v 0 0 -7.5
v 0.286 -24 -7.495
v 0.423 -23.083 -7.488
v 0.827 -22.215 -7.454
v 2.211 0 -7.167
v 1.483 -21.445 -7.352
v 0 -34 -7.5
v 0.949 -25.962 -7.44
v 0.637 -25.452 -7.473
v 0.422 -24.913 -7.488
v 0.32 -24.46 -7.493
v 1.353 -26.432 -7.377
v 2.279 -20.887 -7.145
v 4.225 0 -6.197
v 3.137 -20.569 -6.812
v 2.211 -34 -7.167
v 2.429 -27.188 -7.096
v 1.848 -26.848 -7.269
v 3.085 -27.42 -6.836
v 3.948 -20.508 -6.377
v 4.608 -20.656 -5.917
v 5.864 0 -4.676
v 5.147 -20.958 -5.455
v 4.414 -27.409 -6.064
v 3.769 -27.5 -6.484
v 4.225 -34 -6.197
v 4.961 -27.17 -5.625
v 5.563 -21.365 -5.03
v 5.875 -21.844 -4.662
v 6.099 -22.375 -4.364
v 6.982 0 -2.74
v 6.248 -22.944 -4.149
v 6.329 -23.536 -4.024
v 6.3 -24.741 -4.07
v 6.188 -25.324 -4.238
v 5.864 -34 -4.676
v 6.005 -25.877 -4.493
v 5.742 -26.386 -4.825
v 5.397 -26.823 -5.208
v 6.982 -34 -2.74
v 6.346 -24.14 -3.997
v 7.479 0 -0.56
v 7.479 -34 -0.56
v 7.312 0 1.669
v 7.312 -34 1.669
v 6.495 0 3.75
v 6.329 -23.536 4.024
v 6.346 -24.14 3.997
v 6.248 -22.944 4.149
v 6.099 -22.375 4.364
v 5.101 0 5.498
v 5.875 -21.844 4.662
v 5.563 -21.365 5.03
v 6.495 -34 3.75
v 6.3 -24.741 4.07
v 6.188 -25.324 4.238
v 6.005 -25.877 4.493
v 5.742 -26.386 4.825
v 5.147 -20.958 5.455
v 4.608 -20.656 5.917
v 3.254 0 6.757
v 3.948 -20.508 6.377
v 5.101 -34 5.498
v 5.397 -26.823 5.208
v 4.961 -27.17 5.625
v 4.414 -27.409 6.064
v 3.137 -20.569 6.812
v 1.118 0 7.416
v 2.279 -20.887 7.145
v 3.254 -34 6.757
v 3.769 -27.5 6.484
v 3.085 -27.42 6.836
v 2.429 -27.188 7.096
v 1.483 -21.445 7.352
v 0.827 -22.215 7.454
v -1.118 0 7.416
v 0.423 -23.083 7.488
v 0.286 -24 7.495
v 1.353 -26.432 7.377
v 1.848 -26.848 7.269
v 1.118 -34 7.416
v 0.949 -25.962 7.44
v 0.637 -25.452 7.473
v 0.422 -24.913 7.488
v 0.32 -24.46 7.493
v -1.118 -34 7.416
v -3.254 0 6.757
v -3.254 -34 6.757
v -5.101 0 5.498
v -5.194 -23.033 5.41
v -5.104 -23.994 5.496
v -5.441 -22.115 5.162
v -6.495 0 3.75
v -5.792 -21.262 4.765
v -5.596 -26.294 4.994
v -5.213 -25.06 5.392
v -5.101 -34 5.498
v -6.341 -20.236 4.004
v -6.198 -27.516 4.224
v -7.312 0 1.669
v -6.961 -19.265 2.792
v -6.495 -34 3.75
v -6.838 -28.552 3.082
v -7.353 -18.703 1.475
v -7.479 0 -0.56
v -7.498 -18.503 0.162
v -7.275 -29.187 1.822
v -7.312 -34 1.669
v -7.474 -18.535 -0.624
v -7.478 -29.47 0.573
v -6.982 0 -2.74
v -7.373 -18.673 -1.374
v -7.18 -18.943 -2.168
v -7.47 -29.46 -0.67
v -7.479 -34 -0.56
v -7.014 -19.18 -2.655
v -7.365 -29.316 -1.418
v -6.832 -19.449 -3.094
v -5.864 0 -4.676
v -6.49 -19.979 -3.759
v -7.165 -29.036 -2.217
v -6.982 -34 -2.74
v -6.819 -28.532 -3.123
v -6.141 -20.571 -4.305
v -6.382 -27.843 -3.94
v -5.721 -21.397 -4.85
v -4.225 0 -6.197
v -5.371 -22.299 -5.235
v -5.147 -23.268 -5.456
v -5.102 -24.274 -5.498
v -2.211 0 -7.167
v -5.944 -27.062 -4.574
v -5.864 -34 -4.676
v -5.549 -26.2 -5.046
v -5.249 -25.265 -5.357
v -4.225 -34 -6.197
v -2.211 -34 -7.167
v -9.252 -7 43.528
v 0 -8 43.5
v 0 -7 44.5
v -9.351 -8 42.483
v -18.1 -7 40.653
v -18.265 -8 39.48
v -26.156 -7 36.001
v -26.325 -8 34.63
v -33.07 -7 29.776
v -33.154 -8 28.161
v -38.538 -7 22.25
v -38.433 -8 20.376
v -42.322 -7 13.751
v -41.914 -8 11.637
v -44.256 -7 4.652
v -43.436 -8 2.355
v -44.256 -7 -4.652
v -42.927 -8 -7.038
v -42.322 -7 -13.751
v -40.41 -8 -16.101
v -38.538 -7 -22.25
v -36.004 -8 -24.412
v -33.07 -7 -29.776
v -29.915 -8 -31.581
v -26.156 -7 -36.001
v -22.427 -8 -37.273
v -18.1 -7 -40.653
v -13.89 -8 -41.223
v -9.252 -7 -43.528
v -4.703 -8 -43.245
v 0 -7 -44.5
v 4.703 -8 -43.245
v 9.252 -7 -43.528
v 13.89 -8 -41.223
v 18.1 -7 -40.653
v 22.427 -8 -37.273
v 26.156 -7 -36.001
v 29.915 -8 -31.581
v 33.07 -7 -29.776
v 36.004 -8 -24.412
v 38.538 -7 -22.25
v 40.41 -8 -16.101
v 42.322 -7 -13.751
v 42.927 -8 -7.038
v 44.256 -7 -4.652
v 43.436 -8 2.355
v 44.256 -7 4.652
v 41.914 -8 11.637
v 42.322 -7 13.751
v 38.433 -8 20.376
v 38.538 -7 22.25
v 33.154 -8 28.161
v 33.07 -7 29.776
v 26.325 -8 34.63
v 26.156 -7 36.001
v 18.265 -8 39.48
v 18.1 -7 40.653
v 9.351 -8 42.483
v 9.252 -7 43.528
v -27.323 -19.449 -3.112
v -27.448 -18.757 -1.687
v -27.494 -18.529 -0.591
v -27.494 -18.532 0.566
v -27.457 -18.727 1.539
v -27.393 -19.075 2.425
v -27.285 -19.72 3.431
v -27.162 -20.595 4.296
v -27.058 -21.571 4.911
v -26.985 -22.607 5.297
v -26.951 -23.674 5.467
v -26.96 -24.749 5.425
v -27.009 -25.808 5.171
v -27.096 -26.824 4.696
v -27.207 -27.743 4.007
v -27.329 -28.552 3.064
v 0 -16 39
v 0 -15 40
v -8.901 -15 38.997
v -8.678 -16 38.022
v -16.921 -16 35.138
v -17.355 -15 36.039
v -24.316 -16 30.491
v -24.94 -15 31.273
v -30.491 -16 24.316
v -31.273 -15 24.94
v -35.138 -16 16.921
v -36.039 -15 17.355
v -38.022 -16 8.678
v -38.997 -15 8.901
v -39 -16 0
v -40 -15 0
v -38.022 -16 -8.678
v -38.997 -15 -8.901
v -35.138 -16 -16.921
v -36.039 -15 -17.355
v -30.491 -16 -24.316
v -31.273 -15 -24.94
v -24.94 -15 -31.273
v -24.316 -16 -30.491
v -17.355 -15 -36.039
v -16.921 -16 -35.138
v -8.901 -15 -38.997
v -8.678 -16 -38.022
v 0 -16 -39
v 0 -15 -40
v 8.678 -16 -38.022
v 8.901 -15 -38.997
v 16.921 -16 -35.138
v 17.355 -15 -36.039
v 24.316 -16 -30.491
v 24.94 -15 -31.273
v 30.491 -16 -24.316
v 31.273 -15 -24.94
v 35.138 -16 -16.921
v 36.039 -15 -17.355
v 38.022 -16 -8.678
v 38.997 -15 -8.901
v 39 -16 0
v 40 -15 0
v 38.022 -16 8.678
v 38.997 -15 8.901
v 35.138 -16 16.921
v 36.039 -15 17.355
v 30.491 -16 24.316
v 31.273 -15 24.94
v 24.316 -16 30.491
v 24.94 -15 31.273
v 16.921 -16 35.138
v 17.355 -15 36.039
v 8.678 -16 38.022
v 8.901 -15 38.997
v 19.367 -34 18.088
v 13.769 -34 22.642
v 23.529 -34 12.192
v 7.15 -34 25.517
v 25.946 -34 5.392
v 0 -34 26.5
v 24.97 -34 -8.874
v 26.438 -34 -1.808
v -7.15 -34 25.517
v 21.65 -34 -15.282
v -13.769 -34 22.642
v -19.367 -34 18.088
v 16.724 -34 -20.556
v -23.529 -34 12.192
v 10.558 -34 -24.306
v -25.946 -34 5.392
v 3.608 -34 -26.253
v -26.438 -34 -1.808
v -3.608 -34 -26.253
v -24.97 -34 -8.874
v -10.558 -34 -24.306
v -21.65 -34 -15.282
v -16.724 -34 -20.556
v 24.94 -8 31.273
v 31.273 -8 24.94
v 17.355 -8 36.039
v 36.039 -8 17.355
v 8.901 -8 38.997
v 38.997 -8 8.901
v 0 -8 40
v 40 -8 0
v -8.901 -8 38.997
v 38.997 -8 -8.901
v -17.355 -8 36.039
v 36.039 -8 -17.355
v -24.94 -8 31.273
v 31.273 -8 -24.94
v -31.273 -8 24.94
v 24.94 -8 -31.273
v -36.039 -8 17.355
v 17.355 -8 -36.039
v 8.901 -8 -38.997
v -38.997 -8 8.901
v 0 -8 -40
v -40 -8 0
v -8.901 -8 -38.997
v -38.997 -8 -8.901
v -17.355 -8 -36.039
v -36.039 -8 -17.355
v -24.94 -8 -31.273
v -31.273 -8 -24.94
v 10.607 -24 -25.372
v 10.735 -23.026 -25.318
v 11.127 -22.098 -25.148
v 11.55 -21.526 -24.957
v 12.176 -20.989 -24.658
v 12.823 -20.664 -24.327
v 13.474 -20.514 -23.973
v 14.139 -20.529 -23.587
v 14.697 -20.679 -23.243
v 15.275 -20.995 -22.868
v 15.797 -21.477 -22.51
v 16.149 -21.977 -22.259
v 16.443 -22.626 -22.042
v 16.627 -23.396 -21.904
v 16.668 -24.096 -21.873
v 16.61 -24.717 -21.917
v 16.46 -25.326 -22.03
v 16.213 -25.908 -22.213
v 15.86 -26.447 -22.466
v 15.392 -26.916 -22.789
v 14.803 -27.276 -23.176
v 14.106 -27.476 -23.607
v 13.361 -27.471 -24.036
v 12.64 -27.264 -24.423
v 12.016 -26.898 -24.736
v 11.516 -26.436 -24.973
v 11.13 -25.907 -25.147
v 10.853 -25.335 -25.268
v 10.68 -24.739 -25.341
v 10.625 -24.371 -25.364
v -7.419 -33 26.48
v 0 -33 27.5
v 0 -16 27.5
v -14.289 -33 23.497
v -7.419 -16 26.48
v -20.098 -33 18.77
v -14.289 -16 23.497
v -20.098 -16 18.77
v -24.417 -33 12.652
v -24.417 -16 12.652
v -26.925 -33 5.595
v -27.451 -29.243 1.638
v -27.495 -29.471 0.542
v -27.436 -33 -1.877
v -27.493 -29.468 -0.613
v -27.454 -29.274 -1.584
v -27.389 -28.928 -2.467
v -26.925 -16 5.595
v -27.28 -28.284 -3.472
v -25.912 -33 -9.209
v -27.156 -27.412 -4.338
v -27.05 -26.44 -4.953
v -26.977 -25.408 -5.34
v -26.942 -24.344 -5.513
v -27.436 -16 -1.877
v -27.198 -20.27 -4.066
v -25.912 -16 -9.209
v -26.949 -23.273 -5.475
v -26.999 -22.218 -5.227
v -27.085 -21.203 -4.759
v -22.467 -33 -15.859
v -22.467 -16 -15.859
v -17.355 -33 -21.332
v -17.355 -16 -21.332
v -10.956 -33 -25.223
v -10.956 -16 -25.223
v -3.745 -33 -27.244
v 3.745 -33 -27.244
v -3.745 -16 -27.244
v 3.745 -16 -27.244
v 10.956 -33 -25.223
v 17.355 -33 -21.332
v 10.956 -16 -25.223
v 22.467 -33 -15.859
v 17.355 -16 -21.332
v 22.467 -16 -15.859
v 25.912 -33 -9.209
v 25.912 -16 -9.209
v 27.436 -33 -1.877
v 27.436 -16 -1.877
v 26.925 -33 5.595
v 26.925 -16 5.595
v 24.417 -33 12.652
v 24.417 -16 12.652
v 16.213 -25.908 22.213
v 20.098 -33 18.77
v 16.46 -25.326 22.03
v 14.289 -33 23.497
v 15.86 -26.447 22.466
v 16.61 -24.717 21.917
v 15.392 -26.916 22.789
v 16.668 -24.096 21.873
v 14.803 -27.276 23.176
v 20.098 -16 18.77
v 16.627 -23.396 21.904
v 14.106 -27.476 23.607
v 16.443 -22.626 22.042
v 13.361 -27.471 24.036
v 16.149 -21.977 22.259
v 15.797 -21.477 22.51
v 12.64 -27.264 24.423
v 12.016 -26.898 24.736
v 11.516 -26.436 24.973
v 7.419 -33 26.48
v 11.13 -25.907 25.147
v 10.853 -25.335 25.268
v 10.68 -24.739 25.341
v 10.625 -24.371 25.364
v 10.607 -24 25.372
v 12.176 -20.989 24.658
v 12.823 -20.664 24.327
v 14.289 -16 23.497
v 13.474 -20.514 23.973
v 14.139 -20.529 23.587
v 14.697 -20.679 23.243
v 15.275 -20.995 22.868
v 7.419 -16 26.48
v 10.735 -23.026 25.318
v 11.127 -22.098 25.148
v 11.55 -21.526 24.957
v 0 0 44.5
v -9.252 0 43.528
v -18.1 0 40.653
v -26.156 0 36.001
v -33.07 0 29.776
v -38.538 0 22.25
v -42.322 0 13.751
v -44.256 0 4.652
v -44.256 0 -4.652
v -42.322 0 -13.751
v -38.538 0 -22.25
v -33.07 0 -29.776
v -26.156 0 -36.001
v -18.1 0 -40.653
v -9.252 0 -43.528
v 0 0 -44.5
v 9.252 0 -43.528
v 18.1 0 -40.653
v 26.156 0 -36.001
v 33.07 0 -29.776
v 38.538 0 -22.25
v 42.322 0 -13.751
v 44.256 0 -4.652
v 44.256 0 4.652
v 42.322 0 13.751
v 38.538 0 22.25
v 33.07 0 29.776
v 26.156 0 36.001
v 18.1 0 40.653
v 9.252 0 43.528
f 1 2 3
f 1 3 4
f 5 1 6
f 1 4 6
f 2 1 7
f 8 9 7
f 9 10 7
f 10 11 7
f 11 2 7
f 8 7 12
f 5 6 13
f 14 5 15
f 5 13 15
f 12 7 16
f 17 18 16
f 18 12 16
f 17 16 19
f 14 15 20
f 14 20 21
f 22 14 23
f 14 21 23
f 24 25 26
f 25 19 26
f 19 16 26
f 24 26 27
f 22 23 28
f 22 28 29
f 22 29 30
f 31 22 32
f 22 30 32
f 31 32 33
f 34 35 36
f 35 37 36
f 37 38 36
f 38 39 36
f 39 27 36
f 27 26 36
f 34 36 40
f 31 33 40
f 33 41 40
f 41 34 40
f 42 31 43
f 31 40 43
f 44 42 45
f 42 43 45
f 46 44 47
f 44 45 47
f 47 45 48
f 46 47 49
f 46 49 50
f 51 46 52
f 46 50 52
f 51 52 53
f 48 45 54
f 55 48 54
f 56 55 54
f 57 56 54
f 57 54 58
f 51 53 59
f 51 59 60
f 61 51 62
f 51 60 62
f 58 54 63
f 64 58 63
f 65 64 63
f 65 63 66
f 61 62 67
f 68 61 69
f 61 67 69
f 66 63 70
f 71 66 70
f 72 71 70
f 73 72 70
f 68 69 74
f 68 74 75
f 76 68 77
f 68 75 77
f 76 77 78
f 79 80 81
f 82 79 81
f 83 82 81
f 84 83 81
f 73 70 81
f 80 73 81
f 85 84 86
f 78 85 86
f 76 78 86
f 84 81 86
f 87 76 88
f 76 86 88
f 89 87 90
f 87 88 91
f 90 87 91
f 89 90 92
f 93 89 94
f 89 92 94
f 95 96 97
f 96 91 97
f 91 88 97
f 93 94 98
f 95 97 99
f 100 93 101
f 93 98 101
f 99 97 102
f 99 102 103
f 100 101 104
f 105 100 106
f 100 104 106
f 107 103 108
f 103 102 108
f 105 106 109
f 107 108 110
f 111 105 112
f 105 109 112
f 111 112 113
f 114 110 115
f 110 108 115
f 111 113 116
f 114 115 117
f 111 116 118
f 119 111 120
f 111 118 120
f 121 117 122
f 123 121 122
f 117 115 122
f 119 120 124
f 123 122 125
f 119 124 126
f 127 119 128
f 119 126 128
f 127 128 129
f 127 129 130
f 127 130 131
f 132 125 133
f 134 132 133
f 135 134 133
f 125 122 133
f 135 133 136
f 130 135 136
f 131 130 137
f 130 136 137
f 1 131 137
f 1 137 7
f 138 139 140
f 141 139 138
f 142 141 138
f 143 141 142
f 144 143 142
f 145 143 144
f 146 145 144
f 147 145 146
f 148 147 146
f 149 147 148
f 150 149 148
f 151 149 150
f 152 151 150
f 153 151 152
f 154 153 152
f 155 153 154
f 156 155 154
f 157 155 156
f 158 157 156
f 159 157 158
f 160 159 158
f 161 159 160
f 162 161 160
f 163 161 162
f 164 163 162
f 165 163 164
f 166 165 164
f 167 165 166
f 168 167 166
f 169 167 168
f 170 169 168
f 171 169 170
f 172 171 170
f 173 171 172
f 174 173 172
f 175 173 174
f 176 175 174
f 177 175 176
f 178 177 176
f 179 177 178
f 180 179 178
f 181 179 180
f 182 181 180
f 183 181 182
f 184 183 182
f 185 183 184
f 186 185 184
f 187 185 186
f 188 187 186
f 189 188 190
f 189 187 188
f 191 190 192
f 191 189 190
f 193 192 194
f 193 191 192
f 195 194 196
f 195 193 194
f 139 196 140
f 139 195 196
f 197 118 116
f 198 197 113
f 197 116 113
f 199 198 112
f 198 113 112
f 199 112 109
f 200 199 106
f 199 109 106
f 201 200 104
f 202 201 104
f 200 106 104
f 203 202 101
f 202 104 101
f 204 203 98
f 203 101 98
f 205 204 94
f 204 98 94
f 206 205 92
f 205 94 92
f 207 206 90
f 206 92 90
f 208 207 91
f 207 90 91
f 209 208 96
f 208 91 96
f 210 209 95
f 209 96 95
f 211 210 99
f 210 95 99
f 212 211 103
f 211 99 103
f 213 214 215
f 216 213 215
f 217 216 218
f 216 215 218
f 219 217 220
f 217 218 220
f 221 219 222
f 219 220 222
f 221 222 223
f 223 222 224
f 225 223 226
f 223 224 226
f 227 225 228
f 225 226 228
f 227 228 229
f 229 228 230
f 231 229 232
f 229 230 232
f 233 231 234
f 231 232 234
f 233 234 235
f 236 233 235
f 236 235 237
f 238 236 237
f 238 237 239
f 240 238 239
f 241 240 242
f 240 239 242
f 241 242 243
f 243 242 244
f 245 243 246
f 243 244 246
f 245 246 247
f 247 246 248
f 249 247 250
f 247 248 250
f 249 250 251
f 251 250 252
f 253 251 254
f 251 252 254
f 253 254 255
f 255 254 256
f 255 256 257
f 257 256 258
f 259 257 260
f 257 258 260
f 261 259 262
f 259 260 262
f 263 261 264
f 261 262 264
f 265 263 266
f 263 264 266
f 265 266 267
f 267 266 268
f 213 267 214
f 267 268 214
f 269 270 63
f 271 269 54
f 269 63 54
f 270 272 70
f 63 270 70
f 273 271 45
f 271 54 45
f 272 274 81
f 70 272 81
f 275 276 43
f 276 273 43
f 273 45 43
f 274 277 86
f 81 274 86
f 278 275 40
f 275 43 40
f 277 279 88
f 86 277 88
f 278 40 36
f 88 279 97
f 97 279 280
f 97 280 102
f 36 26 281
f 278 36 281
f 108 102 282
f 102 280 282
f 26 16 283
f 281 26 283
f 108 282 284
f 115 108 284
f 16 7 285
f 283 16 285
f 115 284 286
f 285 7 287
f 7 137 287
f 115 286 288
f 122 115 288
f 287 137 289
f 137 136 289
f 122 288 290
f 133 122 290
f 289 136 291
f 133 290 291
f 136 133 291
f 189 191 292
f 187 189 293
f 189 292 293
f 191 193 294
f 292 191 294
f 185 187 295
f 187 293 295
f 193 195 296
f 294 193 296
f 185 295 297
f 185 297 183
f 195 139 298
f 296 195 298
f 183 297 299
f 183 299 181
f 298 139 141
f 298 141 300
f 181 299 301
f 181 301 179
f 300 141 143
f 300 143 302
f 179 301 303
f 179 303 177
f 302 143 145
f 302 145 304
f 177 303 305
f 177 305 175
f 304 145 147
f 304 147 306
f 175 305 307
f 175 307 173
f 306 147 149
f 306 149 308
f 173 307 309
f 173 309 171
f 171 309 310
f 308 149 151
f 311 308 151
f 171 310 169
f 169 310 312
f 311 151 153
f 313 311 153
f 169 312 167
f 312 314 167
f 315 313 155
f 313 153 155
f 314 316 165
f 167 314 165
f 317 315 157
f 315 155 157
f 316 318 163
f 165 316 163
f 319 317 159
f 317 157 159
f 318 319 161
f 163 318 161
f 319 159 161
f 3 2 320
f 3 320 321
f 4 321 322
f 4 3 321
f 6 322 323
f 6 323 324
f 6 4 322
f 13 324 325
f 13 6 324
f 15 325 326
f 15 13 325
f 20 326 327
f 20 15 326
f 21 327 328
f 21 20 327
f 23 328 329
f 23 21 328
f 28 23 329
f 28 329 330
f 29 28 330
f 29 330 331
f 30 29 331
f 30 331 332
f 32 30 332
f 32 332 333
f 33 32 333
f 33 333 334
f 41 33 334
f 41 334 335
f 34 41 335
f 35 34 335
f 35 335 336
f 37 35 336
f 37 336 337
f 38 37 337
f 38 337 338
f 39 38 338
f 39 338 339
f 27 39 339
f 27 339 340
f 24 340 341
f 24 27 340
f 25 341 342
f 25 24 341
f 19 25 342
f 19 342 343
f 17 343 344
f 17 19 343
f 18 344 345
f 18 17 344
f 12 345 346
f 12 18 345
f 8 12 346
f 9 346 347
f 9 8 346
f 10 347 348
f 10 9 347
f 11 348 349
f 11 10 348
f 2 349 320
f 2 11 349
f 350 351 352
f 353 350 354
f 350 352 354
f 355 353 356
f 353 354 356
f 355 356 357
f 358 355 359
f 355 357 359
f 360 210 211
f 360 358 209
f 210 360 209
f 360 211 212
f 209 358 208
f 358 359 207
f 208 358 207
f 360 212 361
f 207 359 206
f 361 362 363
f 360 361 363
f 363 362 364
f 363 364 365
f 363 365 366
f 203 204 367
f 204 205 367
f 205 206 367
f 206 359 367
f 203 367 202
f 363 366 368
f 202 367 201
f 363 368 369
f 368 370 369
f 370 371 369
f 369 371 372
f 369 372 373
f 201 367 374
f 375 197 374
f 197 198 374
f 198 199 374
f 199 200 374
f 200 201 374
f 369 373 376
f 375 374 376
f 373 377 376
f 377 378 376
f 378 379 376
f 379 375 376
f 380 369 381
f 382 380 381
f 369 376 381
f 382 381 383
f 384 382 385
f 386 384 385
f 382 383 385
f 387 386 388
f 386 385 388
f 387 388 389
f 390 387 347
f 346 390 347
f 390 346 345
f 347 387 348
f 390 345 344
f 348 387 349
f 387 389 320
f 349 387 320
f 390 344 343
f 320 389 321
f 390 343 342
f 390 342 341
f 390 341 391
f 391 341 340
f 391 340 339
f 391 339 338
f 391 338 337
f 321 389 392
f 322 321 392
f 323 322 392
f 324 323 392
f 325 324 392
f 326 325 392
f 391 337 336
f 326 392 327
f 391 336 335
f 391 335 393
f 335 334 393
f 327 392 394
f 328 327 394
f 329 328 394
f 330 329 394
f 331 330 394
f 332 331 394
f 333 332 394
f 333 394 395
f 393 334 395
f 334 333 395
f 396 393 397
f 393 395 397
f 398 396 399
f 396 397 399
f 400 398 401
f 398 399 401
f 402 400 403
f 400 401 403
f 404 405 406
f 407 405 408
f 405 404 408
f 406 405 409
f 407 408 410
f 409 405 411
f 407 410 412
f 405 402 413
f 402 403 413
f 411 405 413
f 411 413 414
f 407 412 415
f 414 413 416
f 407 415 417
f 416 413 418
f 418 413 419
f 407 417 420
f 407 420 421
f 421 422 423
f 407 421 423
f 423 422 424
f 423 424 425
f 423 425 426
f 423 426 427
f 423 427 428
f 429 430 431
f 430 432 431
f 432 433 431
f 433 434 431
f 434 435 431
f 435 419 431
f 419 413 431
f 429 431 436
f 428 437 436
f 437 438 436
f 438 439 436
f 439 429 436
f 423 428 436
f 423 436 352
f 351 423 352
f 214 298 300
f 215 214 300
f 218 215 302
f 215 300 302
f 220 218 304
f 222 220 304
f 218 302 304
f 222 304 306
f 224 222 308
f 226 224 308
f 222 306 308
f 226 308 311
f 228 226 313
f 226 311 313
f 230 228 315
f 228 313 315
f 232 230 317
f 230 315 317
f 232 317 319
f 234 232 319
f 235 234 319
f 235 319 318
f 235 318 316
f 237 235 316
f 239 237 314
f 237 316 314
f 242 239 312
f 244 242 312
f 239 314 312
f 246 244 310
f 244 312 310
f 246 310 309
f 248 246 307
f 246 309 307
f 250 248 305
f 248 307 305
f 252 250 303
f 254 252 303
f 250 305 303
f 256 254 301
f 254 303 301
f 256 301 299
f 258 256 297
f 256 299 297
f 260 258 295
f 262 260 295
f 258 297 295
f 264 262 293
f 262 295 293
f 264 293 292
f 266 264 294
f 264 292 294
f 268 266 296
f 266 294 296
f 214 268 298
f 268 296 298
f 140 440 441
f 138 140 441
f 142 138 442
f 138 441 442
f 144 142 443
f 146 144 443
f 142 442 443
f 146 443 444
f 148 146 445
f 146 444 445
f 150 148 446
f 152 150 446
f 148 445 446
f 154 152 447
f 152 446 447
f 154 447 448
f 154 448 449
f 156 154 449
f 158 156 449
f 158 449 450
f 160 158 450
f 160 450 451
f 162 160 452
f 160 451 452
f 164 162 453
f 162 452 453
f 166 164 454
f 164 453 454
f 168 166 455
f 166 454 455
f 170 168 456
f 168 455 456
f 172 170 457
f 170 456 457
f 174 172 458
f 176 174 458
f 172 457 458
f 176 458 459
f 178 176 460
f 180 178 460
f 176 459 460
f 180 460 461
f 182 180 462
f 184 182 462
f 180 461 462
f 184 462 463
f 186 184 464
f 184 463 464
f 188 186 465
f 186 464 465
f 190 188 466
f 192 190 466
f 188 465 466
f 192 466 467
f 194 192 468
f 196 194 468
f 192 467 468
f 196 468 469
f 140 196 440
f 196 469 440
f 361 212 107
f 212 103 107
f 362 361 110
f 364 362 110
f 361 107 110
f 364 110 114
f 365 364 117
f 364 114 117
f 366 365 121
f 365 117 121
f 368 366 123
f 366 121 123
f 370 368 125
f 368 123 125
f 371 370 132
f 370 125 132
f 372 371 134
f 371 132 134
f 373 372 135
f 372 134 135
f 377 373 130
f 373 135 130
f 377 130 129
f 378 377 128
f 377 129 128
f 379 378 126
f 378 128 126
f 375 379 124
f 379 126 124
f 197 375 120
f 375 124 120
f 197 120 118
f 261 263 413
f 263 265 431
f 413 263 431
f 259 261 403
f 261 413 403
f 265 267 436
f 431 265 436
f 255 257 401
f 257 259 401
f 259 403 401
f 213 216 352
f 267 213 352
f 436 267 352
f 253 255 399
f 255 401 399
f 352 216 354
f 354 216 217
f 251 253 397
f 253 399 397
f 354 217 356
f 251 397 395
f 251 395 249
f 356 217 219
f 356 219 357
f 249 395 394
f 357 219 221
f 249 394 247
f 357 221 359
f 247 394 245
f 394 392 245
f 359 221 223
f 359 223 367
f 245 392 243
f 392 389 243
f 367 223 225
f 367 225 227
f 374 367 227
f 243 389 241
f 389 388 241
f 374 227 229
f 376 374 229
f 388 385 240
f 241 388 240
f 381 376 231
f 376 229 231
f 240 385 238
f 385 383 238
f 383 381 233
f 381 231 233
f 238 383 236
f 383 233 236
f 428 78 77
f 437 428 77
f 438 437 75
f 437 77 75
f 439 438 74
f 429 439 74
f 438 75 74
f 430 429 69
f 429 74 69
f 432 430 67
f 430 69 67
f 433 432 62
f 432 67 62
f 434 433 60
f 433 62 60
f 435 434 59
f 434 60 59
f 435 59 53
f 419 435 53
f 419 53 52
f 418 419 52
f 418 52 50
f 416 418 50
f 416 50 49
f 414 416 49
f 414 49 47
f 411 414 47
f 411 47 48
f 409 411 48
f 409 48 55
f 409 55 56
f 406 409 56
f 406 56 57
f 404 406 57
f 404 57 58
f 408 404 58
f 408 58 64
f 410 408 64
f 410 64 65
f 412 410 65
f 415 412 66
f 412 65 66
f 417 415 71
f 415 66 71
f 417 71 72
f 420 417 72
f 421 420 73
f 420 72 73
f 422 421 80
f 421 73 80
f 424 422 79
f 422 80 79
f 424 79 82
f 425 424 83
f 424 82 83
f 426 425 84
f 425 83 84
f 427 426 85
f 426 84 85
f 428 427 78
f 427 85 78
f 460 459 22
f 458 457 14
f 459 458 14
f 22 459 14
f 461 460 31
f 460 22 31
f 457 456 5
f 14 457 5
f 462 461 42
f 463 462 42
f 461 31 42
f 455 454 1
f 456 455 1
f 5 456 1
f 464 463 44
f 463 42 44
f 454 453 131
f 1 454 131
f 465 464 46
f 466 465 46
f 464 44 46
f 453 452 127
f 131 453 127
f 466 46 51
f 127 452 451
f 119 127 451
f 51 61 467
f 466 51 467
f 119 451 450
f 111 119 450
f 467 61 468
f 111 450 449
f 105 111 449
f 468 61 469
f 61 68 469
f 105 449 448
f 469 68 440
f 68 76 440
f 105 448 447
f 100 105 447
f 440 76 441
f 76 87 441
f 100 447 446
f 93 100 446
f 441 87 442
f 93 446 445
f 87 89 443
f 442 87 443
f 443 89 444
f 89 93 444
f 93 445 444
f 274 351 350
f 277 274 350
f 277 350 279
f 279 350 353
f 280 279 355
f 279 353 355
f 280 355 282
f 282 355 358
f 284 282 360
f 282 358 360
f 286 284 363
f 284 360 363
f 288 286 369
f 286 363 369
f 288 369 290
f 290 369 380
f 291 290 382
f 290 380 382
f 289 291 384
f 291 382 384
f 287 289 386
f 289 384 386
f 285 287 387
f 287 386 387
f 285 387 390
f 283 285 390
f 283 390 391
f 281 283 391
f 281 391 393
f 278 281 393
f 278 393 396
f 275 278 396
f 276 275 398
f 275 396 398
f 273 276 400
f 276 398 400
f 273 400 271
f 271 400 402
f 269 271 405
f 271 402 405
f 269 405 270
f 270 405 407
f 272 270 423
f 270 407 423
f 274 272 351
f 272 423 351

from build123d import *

# Parameters (mm, degrees)
FORO_15_0_15_1_D               = 15
FORO_11_0_11_2_D               = 11
FORO_11_0_11_2_DEPTH           = 27.5
FORO_11_0_11_2_ON_FACE_2_D     = 11
FORO_11_0_11_2_ON_FACE_2_DEPTH = 27.5
FORO_7_0_7_1_D                 = 7
FORO_7_0_7_1_DEPTH             = 27.5
SMUSSO1_SIZE                   = 1


with BuildPart() as part:
    # Schizzo2 → Rivoluzione2 (revolve)
    with BuildSketch(Plane.XY, mode=Mode.PRIVATE) as rivoluzione2_sk:
        Polygon((0, 0), (0, -34), (27.5, -34), (27.5, -16), (40, -16), (40, -8), (44.5, -8), (44.5, 0), align=None)
    revolve(rivoluzione2_sk.sketch.rotate(Axis((0, 0, 0), (0, -1, 0)), 90), axis=Axis((0, 0, 0), (0, -1, 0)))

    # Foro Ø15.0 (15)-1 (through all)
    with Locations(Plane.ZX):
        with Locations((0, 0)):
            Hole(FORO_15_0_15_1_D / 2)

    # Foro Ø11.0 (11)-2
    with Locations(Plane(origin=(-27.499989687, -24.000114667, -0.023815764), x_dir=(0.00086602778, 0, -0.999999624998), z_dir=(-0.999999624998, 0, -0.00086602778))):
        with Locations((0, 0)):
            Hole(FORO_11_0_11_2_D / 2, depth=FORO_11_0_11_2_DEPTH)

    # Foro Ø11.0 (11)-2 on face 2
    with Locations(Plane(origin=(-27.461073612, -24.000080572, -0.023731809), x_dir=(0.00086602778, 0, -0.999999624998), z_dir=(-0.999999624998, 0, -0.00086602778))):
        with Locations((0, 0)):
            Hole(FORO_11_0_11_2_ON_FACE_2_D / 2, depth=FORO_11_0_11_2_ON_FACE_2_DEPTH)

    # Foro Ø7.0 (7)-1
    with Locations(Plane(origin=(13.75, -24, 23.815698604), x_dir=(0.866025403784, 0, -0.5), z_dir=(0.5, 0, 0.866025403784))):
        with Locations((0, 0)):
            foro_7_0_7_1 = Hole(FORO_7_0_7_1_D / 2, depth=FORO_7_0_7_1_DEPTH)

    # Specchia1: Foro Ø7.0 (7)-1 across plane
    add(foro_7_0_7_1.mirror(Plane.XY), mode=Mode.SUBTRACT)

    # Smusso1
    smusso1_edges = [part.edges().sort_by_distance(p)[0] for p in [
        (0, -8, -44.5),
        (0, -16, -40),
        (0, -34, -27.5),
    ]]
    chamfer(smusso1_edges, length=SMUSSO1_SIZE)


solid = part.part
